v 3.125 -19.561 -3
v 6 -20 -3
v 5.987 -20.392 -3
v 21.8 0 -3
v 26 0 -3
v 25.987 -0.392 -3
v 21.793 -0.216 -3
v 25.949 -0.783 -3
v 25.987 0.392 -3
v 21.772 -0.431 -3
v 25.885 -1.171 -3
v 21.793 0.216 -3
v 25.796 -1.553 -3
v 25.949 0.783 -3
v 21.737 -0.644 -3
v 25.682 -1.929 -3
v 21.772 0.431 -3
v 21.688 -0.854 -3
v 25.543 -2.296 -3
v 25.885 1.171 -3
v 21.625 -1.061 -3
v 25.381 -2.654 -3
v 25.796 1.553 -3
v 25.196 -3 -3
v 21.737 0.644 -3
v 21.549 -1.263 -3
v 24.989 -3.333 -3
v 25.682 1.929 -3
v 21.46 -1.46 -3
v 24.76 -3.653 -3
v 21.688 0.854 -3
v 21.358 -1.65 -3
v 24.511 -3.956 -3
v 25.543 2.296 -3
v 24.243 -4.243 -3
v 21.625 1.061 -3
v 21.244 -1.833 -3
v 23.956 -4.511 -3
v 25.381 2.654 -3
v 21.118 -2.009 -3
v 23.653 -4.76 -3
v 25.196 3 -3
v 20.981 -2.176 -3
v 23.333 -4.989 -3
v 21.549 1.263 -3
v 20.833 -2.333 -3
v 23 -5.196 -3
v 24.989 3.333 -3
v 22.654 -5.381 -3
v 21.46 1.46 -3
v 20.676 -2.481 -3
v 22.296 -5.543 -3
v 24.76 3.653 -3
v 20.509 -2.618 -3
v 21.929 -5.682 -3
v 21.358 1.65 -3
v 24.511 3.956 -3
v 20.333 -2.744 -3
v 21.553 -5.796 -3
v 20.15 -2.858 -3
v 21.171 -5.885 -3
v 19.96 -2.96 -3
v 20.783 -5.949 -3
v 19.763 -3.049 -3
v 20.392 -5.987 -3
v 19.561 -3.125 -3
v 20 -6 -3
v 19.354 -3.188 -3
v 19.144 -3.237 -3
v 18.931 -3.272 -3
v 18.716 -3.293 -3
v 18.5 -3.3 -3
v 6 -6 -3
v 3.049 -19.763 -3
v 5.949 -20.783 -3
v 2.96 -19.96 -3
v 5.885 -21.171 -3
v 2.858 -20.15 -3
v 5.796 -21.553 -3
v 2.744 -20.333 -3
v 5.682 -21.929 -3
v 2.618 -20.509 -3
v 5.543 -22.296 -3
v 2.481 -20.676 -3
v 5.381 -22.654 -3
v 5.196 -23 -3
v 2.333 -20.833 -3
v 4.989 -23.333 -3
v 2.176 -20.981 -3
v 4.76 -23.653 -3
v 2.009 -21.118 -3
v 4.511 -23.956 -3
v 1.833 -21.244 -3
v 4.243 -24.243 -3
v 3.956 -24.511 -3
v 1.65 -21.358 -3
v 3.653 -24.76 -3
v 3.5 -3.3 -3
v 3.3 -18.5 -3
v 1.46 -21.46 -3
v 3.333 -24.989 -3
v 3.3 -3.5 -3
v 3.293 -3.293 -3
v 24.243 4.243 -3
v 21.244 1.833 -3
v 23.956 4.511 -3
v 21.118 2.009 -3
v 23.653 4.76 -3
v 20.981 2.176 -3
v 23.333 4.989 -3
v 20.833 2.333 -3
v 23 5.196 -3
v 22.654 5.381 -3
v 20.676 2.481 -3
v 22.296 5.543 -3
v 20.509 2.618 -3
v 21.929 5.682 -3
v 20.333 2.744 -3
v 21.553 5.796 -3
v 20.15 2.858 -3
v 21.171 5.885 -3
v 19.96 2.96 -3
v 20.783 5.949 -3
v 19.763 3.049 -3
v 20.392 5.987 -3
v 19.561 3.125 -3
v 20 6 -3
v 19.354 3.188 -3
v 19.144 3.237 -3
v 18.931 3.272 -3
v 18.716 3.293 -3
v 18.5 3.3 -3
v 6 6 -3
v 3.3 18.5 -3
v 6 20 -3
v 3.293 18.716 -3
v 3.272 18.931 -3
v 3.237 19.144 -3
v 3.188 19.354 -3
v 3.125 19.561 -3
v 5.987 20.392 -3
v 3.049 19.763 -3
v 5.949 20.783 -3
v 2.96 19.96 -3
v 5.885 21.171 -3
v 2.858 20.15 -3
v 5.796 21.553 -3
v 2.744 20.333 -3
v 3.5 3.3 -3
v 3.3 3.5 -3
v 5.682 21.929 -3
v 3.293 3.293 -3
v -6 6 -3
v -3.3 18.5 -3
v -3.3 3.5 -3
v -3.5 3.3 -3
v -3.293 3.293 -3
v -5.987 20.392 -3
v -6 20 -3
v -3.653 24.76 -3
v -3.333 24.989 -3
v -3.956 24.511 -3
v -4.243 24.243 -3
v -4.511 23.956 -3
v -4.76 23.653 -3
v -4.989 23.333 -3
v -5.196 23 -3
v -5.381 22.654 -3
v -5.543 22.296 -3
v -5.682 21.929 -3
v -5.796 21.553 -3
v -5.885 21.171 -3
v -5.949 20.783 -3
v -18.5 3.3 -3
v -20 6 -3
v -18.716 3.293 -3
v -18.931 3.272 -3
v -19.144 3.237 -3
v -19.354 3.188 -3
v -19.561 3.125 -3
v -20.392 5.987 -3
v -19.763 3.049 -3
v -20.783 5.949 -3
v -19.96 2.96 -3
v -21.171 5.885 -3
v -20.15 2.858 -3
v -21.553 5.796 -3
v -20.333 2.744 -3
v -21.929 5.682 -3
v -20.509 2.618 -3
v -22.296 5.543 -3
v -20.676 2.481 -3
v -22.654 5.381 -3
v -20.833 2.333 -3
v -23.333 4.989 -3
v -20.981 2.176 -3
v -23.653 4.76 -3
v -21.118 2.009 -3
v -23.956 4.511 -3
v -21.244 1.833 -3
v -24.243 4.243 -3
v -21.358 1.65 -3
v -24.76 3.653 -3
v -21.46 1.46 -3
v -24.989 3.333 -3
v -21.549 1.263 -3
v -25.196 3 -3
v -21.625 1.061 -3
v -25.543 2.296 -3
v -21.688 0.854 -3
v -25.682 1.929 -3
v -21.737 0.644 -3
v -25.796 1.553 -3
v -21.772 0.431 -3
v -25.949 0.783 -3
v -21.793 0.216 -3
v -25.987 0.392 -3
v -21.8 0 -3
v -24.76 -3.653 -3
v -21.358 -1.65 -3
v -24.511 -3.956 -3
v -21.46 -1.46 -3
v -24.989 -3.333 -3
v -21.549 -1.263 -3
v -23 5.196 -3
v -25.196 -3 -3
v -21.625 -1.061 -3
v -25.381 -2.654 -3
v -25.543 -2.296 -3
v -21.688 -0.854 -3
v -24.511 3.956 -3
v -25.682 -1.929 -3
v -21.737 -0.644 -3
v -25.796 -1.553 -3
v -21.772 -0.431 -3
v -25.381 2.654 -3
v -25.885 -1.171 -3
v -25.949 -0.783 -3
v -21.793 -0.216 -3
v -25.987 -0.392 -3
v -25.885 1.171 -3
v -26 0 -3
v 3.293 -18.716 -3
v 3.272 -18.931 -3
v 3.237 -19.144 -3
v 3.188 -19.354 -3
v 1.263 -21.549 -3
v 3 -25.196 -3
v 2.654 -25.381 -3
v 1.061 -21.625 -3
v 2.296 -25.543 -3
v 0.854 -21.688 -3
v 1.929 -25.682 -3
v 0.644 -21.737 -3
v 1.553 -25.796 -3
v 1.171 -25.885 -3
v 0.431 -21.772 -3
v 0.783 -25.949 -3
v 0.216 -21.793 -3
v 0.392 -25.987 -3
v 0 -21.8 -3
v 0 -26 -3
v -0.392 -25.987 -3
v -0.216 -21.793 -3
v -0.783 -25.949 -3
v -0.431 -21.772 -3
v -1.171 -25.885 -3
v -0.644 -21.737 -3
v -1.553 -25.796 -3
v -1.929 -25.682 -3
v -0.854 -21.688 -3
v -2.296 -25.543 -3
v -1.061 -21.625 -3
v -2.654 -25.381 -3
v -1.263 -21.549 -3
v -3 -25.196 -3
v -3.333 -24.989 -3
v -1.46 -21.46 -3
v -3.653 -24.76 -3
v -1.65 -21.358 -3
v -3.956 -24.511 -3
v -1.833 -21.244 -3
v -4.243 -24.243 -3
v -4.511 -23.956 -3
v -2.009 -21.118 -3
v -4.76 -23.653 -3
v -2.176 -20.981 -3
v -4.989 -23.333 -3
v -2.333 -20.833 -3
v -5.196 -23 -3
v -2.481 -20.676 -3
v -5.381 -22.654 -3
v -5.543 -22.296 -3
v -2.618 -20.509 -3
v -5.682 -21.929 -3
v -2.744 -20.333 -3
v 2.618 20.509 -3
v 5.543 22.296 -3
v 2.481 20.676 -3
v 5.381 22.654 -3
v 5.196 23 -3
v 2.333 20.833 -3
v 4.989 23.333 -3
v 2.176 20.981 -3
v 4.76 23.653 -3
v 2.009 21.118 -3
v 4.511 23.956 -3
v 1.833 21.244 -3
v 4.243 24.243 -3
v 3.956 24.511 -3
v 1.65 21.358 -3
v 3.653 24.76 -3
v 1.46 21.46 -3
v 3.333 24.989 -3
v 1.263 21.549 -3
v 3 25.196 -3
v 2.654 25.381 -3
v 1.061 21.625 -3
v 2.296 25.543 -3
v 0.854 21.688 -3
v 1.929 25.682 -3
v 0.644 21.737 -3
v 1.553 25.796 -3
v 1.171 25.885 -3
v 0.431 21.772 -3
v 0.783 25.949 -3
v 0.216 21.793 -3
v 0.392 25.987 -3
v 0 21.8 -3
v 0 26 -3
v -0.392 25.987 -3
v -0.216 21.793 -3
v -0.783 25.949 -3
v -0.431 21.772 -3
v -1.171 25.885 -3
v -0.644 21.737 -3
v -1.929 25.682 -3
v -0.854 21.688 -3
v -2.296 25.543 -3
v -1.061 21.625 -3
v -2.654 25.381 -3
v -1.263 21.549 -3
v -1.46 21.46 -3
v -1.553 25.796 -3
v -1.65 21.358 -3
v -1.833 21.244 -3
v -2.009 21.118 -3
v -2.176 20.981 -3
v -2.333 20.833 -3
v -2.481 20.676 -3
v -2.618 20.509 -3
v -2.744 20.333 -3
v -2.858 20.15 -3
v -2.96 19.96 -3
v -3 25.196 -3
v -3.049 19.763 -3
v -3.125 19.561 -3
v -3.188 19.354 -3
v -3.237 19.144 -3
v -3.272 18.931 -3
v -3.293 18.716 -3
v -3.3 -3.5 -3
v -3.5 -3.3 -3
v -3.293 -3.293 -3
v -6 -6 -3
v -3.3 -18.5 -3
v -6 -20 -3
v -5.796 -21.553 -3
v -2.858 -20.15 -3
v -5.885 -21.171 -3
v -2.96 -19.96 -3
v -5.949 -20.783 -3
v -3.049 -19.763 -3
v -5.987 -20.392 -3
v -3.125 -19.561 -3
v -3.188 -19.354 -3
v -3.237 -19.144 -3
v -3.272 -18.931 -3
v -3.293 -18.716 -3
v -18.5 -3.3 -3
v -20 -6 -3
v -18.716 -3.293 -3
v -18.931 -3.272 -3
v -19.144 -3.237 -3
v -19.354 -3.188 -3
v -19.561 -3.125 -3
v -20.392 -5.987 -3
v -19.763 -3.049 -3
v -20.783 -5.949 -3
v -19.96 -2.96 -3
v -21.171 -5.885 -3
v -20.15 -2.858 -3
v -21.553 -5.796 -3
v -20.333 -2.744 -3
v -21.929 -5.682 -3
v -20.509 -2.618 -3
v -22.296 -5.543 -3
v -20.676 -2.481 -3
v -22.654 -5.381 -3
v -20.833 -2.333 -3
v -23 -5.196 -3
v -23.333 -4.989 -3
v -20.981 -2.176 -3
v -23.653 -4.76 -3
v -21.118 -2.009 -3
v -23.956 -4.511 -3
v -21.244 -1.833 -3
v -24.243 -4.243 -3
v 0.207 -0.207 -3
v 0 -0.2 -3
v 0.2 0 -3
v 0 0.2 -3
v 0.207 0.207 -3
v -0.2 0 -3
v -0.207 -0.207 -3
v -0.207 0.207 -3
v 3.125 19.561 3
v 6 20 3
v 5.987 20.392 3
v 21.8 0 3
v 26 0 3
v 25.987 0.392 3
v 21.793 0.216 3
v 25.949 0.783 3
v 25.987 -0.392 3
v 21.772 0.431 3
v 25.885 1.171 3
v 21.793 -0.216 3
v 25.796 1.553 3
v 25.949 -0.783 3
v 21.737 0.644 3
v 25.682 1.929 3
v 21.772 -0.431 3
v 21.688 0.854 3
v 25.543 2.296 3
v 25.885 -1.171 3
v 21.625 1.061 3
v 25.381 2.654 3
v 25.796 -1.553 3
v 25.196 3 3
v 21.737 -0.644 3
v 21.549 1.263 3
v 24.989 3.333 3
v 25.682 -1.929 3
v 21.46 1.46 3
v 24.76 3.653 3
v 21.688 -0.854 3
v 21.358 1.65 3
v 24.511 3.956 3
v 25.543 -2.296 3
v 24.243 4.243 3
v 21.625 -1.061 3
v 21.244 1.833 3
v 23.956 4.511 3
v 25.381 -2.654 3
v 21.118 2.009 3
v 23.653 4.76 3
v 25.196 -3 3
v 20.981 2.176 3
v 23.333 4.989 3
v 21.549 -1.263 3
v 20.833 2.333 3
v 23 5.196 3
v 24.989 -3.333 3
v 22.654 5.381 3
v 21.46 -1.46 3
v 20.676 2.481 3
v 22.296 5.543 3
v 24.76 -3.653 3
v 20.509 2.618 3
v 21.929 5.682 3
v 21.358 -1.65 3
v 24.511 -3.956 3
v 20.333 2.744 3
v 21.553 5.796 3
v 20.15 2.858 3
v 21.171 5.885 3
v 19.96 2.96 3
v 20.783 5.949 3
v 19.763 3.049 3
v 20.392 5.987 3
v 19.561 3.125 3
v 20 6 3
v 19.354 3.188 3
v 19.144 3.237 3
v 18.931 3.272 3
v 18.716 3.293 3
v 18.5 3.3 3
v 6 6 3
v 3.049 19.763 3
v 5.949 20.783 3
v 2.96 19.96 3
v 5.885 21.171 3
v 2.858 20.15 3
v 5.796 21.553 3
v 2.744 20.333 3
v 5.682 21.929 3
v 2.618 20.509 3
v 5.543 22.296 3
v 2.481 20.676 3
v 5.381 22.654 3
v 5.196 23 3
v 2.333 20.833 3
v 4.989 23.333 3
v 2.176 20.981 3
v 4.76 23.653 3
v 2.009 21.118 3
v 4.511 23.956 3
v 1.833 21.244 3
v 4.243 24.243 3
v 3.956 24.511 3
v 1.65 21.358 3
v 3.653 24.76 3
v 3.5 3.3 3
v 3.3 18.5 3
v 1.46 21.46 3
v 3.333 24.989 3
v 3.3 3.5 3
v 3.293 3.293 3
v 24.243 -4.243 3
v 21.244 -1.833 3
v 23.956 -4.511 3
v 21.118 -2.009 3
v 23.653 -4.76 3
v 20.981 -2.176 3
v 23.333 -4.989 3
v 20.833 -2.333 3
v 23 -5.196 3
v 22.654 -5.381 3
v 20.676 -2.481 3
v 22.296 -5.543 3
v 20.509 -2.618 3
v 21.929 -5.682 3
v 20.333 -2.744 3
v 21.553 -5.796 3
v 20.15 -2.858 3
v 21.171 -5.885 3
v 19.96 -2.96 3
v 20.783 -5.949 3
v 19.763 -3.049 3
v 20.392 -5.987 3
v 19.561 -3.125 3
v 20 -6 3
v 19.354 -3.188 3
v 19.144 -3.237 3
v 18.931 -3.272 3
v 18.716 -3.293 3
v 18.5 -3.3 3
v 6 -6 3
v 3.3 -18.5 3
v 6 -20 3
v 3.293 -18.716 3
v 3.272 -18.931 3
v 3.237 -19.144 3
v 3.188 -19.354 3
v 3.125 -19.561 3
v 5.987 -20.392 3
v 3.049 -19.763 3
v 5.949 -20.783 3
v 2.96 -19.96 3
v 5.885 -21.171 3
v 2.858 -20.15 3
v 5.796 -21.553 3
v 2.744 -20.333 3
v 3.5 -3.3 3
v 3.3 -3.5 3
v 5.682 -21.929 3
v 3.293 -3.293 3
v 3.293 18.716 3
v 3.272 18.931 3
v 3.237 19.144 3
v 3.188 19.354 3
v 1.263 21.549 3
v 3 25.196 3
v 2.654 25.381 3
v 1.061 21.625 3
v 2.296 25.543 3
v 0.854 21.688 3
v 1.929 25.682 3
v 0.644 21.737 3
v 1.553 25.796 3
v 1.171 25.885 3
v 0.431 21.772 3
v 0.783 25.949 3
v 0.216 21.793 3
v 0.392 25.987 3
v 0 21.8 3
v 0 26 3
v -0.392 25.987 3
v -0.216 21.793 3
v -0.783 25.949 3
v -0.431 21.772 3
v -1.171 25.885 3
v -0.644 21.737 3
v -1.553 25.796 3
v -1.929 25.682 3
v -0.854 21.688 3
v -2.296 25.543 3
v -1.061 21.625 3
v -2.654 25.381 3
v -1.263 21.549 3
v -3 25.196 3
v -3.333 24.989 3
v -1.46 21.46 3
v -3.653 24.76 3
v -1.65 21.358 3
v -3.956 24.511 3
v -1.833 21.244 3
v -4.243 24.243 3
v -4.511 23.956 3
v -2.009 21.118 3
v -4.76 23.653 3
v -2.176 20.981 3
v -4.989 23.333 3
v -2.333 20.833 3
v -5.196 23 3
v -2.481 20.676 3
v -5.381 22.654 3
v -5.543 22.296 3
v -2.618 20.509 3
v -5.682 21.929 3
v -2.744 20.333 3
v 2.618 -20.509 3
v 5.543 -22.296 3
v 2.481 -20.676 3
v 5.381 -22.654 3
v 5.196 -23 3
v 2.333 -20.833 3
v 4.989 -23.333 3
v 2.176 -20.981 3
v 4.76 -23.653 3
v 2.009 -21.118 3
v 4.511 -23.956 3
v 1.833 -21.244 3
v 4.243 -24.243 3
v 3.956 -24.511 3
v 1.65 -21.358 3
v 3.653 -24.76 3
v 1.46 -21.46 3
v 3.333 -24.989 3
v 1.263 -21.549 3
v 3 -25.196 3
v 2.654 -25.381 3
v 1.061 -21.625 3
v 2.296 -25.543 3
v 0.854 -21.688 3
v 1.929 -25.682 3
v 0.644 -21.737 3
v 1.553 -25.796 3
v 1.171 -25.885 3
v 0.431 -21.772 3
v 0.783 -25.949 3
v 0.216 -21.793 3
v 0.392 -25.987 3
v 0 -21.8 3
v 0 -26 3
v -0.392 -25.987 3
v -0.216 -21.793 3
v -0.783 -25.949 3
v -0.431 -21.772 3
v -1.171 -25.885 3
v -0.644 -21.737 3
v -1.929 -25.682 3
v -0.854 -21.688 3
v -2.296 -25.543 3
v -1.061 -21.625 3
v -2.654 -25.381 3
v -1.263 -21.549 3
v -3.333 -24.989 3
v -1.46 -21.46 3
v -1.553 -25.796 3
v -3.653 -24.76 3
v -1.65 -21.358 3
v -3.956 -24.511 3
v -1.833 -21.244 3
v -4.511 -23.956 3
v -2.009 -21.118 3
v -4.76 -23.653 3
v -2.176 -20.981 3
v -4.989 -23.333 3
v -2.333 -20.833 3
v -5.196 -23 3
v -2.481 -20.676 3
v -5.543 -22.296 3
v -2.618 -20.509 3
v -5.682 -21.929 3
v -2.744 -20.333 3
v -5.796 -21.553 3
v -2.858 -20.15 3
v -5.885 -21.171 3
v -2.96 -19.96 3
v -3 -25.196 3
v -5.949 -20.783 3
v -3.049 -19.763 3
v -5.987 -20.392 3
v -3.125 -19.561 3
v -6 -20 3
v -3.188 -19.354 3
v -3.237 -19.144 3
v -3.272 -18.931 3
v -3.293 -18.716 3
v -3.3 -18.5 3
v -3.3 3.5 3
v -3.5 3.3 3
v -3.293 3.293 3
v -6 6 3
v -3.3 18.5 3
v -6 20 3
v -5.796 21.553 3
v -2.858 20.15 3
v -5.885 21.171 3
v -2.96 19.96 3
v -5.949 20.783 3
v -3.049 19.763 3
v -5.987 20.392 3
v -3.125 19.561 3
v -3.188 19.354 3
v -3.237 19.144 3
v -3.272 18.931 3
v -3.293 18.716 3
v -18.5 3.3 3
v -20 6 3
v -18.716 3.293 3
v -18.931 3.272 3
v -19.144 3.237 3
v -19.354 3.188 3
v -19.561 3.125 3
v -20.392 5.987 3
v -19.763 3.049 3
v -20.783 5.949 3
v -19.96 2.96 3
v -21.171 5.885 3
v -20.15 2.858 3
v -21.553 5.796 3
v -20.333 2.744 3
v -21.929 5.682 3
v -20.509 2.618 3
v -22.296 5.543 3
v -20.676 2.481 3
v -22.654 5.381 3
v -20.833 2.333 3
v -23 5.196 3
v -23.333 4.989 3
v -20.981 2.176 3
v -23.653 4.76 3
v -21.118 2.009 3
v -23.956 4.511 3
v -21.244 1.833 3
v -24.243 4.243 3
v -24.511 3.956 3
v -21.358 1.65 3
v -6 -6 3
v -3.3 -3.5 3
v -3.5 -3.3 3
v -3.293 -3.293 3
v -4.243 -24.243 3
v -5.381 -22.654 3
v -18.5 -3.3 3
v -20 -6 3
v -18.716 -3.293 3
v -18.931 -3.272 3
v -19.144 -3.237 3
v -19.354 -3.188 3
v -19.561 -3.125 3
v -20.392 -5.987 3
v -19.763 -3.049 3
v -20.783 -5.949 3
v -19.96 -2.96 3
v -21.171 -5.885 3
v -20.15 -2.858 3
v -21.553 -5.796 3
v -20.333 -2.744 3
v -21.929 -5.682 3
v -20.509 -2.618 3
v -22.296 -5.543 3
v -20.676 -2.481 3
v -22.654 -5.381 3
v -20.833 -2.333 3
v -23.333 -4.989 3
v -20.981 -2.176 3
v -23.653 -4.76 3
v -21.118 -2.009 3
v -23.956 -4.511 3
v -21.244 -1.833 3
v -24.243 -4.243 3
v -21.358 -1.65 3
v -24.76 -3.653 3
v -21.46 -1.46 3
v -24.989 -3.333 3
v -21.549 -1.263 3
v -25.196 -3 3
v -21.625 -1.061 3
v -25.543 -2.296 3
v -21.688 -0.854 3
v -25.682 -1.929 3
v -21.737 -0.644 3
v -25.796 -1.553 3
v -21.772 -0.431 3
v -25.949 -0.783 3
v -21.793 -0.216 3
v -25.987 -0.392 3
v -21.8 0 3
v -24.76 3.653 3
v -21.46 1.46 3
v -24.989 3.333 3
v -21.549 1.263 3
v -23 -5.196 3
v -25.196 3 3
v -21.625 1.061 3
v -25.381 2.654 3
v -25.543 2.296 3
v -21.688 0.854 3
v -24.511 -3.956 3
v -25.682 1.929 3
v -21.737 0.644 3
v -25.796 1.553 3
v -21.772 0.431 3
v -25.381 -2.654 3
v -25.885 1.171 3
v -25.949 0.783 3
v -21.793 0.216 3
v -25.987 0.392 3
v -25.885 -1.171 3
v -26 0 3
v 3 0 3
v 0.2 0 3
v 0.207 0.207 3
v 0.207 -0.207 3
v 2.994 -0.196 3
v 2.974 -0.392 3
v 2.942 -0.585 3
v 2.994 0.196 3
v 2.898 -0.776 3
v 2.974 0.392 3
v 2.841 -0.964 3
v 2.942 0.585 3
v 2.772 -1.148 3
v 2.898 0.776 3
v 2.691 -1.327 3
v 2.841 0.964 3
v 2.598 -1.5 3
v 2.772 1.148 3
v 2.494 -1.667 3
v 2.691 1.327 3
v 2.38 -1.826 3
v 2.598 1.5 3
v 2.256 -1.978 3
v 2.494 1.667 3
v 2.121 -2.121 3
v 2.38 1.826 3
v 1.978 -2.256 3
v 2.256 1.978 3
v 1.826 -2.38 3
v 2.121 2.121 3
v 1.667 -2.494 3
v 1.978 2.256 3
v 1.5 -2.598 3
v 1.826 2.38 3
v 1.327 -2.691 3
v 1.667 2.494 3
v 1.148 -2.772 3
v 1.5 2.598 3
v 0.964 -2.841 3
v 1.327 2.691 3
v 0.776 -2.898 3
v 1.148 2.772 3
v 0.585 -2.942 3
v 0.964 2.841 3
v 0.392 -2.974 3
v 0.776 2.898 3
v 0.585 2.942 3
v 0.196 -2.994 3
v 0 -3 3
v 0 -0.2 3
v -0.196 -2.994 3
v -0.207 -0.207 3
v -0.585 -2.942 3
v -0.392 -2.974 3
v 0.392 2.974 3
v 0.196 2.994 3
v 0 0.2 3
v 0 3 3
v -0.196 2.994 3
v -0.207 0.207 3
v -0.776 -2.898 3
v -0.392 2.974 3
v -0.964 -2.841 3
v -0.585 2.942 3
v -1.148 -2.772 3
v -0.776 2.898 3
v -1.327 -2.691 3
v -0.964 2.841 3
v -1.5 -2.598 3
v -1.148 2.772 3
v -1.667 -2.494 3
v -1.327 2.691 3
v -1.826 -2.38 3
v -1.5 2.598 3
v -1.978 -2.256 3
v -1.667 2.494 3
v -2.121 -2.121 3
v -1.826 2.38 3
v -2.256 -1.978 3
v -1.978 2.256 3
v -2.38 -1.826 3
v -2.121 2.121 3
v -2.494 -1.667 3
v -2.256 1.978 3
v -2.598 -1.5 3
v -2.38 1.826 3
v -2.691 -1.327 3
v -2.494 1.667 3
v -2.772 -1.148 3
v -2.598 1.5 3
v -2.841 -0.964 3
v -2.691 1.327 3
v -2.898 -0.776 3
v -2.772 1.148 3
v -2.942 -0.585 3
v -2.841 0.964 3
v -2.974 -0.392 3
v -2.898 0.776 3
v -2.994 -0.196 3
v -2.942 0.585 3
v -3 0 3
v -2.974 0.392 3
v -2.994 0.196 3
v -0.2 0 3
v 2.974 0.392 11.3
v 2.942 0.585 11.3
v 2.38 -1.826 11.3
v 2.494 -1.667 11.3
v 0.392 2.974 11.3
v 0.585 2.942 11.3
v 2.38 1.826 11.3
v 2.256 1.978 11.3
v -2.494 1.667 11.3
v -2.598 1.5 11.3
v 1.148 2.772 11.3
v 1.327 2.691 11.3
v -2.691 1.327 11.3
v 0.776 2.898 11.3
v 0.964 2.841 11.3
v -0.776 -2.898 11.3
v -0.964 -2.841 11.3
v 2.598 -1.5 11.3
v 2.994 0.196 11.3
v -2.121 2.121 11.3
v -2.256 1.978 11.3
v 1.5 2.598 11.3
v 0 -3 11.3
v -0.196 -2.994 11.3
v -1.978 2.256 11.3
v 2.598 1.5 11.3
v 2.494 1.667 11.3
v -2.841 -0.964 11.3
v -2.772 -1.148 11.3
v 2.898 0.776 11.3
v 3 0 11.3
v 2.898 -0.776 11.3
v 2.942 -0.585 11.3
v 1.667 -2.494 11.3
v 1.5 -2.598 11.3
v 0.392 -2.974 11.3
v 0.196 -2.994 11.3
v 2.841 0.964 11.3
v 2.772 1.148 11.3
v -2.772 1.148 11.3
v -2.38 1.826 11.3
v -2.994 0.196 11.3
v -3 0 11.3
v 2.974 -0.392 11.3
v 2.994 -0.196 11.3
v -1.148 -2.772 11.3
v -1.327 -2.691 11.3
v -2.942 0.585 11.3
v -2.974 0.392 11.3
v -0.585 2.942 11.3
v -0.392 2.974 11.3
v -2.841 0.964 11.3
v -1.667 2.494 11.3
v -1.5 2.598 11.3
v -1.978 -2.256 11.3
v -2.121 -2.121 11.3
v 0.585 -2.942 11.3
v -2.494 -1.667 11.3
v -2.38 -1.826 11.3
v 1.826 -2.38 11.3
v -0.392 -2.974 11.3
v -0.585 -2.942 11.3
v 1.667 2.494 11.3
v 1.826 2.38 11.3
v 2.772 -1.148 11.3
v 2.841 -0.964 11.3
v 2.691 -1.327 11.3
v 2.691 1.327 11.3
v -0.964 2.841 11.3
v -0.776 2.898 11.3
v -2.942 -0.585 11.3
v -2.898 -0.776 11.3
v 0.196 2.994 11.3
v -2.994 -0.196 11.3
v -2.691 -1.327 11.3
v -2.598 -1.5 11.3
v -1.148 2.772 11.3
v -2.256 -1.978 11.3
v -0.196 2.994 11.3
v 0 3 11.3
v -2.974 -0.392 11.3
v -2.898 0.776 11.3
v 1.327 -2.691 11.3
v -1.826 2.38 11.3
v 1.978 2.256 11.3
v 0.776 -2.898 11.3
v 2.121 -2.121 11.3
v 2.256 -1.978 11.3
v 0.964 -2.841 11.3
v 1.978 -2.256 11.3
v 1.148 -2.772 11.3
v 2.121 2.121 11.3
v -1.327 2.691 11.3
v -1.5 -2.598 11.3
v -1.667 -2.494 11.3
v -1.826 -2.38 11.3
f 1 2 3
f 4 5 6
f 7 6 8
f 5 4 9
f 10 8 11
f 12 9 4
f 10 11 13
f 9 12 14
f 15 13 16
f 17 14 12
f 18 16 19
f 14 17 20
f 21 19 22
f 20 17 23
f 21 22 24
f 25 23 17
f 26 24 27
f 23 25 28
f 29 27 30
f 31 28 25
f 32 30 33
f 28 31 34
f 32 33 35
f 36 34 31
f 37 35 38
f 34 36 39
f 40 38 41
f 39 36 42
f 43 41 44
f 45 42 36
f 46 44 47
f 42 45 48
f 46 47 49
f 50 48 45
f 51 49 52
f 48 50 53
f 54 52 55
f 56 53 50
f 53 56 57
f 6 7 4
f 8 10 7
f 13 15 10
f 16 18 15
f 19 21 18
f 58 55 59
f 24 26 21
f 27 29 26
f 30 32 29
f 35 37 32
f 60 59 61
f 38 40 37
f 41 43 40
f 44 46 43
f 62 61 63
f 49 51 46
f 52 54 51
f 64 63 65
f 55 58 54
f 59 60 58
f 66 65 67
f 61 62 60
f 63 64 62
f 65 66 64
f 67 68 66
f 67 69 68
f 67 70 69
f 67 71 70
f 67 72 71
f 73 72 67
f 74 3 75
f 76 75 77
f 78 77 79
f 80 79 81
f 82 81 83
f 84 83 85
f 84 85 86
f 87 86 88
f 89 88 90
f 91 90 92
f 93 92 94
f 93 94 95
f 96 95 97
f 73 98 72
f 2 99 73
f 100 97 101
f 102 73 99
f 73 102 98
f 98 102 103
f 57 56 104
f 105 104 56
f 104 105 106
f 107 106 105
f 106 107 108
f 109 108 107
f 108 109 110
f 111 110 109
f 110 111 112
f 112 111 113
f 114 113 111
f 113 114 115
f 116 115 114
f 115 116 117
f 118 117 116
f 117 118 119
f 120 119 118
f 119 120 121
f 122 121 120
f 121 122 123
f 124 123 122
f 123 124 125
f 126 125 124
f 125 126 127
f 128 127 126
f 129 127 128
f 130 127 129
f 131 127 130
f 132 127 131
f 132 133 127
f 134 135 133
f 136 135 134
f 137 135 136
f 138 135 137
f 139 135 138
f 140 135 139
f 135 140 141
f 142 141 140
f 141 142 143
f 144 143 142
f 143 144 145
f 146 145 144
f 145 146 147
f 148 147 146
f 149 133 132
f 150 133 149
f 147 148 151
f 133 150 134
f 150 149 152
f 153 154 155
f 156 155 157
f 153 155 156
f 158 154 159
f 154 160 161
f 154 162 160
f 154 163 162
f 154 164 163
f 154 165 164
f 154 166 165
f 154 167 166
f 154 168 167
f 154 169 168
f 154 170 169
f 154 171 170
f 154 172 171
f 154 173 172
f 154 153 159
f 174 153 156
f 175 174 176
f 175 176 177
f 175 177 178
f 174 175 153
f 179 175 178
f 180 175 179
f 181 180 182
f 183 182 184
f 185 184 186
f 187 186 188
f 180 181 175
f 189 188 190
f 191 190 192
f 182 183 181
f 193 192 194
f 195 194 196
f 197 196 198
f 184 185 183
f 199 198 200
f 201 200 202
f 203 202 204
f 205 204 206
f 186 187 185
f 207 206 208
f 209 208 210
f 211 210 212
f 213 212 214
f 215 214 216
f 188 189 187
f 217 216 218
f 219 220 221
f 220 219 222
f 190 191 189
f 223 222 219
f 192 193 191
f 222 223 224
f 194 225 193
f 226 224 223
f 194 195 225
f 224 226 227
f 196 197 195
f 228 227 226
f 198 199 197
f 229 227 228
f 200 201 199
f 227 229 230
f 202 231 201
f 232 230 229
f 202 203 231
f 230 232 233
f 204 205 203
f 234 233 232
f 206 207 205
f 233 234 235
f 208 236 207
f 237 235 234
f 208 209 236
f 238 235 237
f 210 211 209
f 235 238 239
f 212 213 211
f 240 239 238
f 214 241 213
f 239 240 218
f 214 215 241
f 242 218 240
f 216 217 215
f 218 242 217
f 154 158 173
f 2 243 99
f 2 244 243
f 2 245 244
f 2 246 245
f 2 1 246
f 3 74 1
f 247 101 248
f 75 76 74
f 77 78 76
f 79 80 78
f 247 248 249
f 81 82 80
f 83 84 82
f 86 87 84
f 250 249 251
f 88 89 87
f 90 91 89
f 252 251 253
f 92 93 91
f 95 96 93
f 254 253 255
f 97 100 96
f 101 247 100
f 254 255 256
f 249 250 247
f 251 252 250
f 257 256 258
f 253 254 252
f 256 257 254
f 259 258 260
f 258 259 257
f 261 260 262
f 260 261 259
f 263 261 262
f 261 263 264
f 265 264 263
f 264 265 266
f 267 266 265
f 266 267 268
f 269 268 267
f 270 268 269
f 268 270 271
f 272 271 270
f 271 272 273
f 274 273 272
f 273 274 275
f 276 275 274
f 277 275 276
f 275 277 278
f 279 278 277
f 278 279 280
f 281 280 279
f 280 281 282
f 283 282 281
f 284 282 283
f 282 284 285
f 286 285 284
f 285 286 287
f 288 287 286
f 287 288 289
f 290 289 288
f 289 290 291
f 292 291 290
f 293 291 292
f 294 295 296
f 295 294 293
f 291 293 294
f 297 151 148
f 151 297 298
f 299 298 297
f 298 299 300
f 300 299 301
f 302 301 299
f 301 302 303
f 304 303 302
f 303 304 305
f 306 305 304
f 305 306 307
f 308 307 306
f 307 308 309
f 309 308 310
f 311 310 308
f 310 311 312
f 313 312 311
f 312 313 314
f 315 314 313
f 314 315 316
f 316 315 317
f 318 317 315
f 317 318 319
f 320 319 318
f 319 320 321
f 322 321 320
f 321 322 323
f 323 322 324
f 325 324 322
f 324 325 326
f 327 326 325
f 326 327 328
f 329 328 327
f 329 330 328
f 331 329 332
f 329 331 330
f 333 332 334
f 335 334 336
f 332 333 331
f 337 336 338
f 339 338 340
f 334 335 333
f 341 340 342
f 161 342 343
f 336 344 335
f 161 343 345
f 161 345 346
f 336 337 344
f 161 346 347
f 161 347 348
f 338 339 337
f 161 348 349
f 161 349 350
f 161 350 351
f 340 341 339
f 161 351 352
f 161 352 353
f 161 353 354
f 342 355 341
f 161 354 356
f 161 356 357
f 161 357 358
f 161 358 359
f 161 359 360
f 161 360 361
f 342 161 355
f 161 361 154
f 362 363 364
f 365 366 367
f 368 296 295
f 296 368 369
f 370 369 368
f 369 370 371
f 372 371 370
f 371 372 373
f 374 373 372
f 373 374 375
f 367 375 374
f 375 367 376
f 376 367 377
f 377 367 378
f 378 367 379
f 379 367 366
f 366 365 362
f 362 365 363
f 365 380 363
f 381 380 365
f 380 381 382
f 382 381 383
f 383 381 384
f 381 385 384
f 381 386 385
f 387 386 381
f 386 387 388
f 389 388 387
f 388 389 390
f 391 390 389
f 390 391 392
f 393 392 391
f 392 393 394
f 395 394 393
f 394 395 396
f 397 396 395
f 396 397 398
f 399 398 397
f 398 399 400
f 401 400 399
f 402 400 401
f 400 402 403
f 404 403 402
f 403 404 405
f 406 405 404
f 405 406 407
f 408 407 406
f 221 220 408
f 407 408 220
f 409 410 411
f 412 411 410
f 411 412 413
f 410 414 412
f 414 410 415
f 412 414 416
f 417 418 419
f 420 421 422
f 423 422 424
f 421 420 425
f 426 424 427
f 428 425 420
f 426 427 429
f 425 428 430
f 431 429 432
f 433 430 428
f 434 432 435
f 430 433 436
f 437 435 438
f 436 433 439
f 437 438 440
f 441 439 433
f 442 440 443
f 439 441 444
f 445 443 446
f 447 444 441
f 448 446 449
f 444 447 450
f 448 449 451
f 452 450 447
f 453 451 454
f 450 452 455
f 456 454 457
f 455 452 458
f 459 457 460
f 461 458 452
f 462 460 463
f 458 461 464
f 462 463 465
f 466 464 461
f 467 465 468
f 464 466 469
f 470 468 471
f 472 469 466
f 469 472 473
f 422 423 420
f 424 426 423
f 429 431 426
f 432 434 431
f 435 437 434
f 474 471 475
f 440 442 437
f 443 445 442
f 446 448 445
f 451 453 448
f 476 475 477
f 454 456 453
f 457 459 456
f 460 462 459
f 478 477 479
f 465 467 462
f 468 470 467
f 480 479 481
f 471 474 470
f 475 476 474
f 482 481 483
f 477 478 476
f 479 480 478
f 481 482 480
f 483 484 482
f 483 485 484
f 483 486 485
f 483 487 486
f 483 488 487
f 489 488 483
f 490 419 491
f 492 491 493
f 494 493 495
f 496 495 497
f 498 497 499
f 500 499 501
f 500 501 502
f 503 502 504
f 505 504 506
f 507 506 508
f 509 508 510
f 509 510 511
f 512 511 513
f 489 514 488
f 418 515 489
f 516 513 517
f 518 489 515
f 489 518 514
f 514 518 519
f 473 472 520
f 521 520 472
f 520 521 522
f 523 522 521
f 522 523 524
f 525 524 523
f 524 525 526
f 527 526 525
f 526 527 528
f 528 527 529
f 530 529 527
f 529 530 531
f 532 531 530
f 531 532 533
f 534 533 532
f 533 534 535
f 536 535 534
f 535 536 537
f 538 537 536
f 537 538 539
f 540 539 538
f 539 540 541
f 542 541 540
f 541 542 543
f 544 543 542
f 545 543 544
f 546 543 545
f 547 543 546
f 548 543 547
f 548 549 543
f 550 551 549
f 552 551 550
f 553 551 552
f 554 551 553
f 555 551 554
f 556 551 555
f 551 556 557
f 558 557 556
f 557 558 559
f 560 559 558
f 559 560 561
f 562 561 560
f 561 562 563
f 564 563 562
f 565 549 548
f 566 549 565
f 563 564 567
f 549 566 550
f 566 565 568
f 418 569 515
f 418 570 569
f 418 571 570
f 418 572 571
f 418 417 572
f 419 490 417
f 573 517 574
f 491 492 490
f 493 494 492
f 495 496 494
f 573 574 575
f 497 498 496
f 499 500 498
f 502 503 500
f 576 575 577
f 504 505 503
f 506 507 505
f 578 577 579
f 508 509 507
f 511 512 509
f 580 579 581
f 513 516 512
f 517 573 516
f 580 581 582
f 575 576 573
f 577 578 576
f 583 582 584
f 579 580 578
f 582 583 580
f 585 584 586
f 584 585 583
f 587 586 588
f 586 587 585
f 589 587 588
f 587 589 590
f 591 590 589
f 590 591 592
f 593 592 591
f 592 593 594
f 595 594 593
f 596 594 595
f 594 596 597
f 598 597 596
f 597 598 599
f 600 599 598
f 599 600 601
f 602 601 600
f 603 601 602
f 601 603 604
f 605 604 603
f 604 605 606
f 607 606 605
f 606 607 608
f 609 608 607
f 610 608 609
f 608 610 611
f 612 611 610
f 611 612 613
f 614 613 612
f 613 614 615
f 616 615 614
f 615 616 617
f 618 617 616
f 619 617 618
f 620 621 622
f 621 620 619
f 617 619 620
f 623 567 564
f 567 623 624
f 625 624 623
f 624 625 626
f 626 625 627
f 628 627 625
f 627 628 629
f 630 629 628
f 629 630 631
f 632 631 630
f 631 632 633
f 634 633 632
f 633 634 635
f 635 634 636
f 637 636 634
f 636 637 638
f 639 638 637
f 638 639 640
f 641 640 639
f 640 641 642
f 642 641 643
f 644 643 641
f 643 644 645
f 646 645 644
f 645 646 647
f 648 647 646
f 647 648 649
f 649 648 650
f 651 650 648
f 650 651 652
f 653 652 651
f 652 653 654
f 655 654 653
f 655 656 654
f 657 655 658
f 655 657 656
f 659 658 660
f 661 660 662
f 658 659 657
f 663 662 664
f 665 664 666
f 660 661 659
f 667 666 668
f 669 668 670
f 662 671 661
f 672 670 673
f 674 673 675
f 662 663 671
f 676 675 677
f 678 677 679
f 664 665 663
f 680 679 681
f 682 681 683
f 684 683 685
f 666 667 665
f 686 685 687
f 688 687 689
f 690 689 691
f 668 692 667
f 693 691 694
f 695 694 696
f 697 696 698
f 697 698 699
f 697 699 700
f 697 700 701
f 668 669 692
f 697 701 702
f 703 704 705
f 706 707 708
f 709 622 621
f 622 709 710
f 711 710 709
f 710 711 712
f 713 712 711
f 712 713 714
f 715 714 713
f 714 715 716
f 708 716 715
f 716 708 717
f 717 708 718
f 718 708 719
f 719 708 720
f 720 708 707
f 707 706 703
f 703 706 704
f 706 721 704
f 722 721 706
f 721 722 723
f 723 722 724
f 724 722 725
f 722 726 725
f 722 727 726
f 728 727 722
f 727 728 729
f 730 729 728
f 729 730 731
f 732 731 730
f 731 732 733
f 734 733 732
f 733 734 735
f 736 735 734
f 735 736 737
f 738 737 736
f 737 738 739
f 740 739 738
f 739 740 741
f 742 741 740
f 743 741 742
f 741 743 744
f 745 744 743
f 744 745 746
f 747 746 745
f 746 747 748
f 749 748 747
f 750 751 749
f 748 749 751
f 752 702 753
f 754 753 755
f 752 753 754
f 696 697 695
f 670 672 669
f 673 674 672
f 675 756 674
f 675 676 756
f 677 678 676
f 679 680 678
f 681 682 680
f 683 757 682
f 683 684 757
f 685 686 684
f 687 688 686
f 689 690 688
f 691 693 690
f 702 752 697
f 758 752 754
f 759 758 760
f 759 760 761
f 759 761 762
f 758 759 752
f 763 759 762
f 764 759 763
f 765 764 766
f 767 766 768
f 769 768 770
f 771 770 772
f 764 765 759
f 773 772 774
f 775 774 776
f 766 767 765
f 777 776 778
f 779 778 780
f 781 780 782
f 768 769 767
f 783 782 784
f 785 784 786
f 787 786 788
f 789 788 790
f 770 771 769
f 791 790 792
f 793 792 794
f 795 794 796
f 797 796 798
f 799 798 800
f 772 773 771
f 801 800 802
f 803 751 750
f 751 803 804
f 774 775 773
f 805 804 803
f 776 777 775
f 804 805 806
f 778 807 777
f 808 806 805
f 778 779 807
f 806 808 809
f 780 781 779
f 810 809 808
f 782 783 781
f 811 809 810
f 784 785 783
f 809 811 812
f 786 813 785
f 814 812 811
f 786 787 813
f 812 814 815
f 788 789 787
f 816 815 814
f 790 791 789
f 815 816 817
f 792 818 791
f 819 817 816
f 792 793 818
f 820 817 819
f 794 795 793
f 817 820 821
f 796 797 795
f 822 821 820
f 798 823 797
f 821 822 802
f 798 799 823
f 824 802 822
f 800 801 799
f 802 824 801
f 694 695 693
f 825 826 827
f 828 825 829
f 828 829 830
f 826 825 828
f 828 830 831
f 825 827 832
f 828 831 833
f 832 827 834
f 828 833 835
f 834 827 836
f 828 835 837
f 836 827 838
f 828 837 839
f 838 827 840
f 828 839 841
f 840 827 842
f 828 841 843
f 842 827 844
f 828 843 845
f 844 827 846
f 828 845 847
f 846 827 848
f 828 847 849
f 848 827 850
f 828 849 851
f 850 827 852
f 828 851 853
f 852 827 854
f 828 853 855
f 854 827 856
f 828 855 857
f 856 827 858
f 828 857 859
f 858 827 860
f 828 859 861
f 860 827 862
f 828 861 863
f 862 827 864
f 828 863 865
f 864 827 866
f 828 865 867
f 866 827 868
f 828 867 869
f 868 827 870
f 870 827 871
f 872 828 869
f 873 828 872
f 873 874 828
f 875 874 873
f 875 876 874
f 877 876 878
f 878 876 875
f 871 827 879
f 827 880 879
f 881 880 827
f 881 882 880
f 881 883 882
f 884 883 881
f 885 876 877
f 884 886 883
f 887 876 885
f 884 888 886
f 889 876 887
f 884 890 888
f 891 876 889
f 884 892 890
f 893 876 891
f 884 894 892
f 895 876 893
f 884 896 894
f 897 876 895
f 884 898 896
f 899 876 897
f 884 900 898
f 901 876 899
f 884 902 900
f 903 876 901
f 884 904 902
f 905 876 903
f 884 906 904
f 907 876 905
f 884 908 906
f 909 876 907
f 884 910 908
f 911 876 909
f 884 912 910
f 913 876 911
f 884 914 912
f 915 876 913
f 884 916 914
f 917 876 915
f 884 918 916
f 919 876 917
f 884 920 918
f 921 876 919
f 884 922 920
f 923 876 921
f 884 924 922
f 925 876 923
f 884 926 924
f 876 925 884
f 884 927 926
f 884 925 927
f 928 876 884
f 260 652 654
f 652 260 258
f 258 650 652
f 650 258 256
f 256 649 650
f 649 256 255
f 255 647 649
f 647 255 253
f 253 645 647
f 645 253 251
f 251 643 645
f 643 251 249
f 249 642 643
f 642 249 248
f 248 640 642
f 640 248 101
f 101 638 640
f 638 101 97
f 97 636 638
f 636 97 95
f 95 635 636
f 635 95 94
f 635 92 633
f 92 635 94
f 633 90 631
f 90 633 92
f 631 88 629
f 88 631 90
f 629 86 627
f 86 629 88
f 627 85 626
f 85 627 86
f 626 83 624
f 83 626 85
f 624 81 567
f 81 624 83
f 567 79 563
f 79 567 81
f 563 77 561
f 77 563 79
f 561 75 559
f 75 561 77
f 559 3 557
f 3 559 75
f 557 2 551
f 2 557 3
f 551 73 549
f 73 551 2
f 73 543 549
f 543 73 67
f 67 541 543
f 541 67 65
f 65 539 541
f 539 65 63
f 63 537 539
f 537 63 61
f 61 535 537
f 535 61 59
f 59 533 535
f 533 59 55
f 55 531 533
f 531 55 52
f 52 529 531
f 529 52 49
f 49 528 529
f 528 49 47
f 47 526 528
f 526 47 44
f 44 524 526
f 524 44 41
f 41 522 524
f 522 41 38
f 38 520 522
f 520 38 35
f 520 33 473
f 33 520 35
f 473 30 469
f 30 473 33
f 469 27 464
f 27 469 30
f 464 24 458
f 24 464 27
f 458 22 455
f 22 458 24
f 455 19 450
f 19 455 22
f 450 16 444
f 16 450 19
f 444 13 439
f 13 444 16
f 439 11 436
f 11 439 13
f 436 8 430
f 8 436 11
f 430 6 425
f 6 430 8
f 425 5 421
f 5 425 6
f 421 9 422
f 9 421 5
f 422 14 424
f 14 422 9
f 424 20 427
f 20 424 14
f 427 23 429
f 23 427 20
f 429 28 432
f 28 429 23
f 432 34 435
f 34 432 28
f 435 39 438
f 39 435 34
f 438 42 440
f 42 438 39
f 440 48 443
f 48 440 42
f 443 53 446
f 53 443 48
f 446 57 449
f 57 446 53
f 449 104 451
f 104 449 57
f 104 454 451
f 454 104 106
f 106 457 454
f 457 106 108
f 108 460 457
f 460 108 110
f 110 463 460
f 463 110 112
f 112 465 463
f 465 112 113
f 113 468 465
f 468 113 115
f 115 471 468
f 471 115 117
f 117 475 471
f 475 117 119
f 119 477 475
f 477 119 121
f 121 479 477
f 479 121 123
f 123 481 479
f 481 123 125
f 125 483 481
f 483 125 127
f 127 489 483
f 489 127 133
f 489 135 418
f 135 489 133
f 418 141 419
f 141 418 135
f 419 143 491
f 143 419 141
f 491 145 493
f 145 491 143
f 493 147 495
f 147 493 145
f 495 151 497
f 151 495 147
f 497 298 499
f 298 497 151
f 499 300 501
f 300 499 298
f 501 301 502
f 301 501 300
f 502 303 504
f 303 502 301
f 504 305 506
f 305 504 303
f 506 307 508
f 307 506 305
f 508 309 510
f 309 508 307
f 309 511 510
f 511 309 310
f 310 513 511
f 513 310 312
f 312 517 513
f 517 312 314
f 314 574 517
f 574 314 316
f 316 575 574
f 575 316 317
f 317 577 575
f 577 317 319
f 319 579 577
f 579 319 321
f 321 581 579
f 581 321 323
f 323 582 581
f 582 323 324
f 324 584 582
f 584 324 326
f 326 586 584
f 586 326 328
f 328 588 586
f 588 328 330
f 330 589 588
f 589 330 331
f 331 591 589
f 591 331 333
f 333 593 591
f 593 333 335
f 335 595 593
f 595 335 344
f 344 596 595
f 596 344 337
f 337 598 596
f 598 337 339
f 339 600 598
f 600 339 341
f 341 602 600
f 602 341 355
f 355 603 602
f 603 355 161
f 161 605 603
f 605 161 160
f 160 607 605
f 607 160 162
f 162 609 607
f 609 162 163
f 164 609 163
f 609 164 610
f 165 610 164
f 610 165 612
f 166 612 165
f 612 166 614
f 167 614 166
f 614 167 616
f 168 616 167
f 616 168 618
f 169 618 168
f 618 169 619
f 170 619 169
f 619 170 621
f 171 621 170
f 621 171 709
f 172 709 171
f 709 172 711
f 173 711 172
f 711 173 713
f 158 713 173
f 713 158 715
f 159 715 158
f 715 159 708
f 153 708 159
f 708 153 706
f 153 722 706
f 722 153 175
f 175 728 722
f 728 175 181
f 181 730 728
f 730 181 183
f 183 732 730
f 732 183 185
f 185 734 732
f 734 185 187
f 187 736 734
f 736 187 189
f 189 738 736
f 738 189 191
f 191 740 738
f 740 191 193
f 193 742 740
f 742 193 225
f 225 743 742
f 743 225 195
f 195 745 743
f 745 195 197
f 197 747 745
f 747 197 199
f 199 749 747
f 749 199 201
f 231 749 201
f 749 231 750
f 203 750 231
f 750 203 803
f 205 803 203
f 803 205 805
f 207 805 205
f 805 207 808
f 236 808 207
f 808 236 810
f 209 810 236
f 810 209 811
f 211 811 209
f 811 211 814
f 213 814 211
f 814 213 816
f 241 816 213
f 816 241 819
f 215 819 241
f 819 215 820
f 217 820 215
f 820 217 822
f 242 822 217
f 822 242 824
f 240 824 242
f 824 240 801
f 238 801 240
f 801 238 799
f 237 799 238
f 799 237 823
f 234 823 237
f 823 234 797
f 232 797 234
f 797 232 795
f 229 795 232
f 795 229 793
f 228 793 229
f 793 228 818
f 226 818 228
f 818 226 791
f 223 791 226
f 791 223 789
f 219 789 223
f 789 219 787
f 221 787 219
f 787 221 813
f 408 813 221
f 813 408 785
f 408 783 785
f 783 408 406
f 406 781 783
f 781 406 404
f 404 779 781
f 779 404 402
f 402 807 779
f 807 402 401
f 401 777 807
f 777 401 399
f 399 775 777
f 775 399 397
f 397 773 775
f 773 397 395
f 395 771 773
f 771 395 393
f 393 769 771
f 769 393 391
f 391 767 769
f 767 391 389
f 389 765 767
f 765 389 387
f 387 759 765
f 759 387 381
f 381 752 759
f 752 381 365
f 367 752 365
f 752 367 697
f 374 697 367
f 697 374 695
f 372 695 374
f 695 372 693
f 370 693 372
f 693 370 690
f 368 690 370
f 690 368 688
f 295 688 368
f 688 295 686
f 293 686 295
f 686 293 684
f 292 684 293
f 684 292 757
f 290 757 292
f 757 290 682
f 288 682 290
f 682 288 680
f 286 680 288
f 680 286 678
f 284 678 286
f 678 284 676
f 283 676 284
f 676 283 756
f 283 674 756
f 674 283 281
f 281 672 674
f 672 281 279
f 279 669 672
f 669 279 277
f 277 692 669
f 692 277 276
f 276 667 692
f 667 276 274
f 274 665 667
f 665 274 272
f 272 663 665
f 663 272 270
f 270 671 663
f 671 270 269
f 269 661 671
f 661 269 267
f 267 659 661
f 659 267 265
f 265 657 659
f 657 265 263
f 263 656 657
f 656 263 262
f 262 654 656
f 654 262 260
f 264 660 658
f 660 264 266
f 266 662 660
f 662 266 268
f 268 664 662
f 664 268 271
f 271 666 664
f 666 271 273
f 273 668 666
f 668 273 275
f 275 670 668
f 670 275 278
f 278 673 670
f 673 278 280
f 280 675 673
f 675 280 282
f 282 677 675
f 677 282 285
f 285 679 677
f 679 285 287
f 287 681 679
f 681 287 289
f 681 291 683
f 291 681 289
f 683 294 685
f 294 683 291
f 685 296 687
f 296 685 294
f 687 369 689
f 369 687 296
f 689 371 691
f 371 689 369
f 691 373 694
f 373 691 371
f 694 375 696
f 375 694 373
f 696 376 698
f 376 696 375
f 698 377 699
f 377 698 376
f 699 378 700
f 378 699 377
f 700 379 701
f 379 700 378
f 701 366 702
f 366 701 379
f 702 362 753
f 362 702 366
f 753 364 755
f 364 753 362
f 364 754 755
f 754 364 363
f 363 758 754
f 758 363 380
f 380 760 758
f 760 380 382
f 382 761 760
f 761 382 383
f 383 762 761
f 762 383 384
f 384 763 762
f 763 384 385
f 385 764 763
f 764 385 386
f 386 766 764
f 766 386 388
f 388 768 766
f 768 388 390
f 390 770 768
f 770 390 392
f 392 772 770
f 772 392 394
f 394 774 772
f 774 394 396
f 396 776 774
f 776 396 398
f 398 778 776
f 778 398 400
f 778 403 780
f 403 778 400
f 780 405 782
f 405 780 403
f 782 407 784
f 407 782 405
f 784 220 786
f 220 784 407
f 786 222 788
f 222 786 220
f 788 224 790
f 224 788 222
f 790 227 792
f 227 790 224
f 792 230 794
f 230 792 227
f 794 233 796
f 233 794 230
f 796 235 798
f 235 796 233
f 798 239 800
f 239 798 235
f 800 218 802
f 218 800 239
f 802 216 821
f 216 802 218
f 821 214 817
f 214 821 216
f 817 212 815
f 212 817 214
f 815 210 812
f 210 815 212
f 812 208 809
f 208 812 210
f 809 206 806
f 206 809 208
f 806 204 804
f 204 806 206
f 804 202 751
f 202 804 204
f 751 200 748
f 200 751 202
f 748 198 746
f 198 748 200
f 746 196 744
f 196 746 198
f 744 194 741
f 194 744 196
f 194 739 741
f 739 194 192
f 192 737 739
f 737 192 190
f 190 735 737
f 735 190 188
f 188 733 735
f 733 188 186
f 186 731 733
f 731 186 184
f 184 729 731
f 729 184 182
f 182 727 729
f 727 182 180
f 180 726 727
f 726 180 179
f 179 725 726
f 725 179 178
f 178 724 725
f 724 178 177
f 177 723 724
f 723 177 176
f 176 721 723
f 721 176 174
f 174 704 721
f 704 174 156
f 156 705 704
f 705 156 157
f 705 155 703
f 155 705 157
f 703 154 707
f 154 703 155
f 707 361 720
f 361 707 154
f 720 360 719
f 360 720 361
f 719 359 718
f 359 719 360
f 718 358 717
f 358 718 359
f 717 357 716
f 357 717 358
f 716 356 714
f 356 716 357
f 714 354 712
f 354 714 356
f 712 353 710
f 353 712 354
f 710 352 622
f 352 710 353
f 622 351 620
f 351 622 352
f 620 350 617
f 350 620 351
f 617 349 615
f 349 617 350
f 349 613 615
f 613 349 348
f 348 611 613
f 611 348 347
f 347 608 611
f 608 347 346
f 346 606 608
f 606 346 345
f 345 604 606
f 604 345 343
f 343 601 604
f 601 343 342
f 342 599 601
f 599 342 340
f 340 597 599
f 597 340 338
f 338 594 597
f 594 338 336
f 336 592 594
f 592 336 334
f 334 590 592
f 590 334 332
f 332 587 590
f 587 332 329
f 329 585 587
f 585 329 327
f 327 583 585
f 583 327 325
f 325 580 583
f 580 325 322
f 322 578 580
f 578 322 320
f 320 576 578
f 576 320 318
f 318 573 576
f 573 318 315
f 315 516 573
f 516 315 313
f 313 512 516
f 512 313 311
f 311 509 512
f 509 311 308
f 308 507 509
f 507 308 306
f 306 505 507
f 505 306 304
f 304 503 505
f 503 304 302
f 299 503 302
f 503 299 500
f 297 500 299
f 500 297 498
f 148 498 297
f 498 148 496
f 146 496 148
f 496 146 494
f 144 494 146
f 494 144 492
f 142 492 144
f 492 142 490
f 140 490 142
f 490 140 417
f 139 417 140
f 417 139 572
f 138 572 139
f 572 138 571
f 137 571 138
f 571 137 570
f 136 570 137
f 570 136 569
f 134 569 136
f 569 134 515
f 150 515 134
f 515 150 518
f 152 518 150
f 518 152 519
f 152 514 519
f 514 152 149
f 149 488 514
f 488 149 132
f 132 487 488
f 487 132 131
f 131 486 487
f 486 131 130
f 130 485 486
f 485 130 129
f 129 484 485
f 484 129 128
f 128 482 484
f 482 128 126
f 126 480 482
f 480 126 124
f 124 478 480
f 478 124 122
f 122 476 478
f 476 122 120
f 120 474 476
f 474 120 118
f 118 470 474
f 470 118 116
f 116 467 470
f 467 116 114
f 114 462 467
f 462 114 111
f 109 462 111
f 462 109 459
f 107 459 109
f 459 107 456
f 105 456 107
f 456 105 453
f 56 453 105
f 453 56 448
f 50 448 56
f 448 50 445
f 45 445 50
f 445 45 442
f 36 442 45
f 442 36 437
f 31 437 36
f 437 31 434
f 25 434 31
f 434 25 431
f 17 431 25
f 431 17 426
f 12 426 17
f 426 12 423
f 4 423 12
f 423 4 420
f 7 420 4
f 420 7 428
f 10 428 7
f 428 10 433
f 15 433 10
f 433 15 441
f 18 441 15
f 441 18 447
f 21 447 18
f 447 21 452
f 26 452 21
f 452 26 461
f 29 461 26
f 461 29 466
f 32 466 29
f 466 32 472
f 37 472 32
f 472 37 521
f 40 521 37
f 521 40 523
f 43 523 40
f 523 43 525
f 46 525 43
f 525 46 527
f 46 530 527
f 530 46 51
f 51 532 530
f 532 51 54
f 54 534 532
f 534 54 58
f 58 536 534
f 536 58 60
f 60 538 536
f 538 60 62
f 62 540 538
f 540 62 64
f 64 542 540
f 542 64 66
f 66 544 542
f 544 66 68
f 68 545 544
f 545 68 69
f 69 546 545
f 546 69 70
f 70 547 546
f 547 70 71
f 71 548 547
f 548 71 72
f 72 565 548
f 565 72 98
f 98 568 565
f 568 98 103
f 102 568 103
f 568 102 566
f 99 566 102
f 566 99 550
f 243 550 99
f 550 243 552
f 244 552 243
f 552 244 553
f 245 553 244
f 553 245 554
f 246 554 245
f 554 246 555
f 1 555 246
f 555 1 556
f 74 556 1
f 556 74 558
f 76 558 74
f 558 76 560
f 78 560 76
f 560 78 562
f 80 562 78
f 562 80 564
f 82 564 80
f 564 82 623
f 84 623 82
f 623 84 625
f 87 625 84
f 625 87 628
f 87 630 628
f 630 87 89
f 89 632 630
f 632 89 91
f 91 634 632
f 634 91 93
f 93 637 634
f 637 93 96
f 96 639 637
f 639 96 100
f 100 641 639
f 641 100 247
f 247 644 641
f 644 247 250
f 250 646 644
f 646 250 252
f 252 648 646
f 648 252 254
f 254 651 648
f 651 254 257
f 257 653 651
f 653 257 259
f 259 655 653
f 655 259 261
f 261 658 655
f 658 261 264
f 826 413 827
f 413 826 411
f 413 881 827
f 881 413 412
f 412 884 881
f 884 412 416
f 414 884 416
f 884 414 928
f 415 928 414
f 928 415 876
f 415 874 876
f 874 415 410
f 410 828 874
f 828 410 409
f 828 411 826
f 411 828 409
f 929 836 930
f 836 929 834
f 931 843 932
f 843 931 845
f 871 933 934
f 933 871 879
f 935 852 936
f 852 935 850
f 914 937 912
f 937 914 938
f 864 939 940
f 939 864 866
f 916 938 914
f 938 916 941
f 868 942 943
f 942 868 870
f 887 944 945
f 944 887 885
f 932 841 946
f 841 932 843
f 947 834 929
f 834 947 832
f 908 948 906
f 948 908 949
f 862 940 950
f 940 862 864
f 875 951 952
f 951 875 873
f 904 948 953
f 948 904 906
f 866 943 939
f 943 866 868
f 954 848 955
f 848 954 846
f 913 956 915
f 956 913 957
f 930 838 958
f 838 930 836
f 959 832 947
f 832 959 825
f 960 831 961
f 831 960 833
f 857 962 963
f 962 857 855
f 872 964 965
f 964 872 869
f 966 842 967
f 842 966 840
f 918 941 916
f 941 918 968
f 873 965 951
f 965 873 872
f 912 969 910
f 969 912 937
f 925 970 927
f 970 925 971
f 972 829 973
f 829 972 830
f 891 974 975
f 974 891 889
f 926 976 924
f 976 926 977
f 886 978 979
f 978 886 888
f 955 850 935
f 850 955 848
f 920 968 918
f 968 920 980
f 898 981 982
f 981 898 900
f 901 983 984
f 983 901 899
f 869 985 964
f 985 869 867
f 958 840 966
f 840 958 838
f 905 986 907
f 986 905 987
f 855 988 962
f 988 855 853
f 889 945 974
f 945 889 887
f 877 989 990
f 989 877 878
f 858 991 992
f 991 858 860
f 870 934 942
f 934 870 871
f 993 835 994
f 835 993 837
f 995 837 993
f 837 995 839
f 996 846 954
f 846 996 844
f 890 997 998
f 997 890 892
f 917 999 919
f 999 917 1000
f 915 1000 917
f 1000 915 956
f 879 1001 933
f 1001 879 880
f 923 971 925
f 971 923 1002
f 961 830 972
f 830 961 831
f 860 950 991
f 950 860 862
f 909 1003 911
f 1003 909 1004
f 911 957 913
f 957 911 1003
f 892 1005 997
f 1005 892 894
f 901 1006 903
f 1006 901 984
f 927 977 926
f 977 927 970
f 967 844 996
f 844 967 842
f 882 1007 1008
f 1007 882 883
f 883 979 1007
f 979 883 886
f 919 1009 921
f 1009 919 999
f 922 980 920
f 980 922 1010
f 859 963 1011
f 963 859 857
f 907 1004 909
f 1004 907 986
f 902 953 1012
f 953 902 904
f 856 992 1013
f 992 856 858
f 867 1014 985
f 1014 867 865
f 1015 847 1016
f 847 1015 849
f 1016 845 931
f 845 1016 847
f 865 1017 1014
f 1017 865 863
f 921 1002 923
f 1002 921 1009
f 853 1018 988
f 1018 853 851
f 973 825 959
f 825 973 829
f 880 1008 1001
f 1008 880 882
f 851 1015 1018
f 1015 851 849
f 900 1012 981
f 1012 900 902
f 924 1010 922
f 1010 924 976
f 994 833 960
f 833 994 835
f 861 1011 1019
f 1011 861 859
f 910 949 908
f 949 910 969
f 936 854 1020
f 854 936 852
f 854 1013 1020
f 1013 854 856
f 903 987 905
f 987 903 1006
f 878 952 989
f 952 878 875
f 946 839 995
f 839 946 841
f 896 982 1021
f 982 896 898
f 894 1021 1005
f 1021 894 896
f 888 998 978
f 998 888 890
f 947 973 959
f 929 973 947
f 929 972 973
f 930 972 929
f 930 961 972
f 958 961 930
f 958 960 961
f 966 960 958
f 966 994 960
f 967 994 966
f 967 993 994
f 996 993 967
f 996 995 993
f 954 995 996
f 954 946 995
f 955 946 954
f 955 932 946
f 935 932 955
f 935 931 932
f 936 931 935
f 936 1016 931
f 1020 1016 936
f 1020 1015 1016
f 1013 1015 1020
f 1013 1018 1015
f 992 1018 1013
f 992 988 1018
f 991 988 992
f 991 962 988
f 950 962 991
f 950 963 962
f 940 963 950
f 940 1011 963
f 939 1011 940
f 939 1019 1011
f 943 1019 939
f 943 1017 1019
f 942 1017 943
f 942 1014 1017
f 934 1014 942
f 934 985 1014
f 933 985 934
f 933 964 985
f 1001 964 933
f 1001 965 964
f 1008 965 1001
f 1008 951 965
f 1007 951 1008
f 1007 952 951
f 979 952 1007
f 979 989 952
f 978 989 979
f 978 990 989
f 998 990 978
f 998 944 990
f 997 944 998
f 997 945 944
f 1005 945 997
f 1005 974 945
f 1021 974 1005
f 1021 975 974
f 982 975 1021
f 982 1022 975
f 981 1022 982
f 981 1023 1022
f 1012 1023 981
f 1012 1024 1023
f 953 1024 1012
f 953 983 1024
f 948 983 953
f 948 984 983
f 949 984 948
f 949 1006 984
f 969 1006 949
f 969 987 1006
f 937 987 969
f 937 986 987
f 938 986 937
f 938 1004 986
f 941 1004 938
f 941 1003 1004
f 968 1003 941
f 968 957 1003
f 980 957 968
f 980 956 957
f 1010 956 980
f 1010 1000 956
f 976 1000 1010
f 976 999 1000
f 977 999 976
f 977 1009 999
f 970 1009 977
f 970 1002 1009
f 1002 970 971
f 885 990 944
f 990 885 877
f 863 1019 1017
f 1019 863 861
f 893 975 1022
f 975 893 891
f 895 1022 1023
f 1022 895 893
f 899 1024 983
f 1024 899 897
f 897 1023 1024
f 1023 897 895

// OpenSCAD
$fn=96;

size_xy = 47.8;
size_z  = 14.3;

th = 6.0;                 // main plate thickness
boss_h = size_z - th;     // protrusion height
boss_r = 3.0;

arm_len = 20.0;           // from center to arm tip
arm_w   = 12.0;           // outer arm width
tip_r   = 7.0;            // outer tip rounding radius

cut_w   = 6.6;            // inner cutout width
cut_tip_r = 4.2;          // inner cutout tip rounding
cut_len = 15.0;           // inner cutout length

junction_x = 16.0;
junction_y = 10.0;

hub_r = 8.0;

module capsule2d(len, r){
    hull(){
        translate([-len/2,0]) circle(r=r);
        translate([ len/2,0]) circle(r=r);
    }
}

module teardrop2d(len, w, tip_r){
    // rounded loop/teardrop-like: capsule with slightly larger tip
    union(){
        capsule2d(len=len - 2*tip_r, r=w/2);
        translate([len/2 - tip_r,0]) circle(r=tip_r);
    }
}

module arm2d(){
    // Outer arm: capsule-like with rounded tip
    translate([arm_len/2,0])
        capsule2d(len=arm_len, r=arm_w/2);
}

module arm_cut2d(){
    // Inner cutout: smaller capsule, leaving a loop-like arm
    translate([arm_len/2 + 1.0,0])
        capsule2d(len=cut_len, r=cut_w/2);
}

module cross2d(){
    union(){
        // central junction
        square([junction_x, junction_y], center=true);
        // central rounded hub
        circle(r=hub_r);
        // four arms
        for(a=[0:90:270])
            rotate(a) arm2d();
    }
}

module cutouts2d(){
    union(){
        for(a=[0:90:270])
            rotate(a) arm_cut2d();
    }
}

module main_plate(){
    linear_extrude(height=th, center=true)
        difference(){
            cross2d();
            cutouts2d();
        }
}

module boss(){
    translate([0,0, th/2 + boss_h/2])
        cylinder(h=boss_h, r=boss_r, center=true);
}

union(){
    main_plate();
    boss();
}
